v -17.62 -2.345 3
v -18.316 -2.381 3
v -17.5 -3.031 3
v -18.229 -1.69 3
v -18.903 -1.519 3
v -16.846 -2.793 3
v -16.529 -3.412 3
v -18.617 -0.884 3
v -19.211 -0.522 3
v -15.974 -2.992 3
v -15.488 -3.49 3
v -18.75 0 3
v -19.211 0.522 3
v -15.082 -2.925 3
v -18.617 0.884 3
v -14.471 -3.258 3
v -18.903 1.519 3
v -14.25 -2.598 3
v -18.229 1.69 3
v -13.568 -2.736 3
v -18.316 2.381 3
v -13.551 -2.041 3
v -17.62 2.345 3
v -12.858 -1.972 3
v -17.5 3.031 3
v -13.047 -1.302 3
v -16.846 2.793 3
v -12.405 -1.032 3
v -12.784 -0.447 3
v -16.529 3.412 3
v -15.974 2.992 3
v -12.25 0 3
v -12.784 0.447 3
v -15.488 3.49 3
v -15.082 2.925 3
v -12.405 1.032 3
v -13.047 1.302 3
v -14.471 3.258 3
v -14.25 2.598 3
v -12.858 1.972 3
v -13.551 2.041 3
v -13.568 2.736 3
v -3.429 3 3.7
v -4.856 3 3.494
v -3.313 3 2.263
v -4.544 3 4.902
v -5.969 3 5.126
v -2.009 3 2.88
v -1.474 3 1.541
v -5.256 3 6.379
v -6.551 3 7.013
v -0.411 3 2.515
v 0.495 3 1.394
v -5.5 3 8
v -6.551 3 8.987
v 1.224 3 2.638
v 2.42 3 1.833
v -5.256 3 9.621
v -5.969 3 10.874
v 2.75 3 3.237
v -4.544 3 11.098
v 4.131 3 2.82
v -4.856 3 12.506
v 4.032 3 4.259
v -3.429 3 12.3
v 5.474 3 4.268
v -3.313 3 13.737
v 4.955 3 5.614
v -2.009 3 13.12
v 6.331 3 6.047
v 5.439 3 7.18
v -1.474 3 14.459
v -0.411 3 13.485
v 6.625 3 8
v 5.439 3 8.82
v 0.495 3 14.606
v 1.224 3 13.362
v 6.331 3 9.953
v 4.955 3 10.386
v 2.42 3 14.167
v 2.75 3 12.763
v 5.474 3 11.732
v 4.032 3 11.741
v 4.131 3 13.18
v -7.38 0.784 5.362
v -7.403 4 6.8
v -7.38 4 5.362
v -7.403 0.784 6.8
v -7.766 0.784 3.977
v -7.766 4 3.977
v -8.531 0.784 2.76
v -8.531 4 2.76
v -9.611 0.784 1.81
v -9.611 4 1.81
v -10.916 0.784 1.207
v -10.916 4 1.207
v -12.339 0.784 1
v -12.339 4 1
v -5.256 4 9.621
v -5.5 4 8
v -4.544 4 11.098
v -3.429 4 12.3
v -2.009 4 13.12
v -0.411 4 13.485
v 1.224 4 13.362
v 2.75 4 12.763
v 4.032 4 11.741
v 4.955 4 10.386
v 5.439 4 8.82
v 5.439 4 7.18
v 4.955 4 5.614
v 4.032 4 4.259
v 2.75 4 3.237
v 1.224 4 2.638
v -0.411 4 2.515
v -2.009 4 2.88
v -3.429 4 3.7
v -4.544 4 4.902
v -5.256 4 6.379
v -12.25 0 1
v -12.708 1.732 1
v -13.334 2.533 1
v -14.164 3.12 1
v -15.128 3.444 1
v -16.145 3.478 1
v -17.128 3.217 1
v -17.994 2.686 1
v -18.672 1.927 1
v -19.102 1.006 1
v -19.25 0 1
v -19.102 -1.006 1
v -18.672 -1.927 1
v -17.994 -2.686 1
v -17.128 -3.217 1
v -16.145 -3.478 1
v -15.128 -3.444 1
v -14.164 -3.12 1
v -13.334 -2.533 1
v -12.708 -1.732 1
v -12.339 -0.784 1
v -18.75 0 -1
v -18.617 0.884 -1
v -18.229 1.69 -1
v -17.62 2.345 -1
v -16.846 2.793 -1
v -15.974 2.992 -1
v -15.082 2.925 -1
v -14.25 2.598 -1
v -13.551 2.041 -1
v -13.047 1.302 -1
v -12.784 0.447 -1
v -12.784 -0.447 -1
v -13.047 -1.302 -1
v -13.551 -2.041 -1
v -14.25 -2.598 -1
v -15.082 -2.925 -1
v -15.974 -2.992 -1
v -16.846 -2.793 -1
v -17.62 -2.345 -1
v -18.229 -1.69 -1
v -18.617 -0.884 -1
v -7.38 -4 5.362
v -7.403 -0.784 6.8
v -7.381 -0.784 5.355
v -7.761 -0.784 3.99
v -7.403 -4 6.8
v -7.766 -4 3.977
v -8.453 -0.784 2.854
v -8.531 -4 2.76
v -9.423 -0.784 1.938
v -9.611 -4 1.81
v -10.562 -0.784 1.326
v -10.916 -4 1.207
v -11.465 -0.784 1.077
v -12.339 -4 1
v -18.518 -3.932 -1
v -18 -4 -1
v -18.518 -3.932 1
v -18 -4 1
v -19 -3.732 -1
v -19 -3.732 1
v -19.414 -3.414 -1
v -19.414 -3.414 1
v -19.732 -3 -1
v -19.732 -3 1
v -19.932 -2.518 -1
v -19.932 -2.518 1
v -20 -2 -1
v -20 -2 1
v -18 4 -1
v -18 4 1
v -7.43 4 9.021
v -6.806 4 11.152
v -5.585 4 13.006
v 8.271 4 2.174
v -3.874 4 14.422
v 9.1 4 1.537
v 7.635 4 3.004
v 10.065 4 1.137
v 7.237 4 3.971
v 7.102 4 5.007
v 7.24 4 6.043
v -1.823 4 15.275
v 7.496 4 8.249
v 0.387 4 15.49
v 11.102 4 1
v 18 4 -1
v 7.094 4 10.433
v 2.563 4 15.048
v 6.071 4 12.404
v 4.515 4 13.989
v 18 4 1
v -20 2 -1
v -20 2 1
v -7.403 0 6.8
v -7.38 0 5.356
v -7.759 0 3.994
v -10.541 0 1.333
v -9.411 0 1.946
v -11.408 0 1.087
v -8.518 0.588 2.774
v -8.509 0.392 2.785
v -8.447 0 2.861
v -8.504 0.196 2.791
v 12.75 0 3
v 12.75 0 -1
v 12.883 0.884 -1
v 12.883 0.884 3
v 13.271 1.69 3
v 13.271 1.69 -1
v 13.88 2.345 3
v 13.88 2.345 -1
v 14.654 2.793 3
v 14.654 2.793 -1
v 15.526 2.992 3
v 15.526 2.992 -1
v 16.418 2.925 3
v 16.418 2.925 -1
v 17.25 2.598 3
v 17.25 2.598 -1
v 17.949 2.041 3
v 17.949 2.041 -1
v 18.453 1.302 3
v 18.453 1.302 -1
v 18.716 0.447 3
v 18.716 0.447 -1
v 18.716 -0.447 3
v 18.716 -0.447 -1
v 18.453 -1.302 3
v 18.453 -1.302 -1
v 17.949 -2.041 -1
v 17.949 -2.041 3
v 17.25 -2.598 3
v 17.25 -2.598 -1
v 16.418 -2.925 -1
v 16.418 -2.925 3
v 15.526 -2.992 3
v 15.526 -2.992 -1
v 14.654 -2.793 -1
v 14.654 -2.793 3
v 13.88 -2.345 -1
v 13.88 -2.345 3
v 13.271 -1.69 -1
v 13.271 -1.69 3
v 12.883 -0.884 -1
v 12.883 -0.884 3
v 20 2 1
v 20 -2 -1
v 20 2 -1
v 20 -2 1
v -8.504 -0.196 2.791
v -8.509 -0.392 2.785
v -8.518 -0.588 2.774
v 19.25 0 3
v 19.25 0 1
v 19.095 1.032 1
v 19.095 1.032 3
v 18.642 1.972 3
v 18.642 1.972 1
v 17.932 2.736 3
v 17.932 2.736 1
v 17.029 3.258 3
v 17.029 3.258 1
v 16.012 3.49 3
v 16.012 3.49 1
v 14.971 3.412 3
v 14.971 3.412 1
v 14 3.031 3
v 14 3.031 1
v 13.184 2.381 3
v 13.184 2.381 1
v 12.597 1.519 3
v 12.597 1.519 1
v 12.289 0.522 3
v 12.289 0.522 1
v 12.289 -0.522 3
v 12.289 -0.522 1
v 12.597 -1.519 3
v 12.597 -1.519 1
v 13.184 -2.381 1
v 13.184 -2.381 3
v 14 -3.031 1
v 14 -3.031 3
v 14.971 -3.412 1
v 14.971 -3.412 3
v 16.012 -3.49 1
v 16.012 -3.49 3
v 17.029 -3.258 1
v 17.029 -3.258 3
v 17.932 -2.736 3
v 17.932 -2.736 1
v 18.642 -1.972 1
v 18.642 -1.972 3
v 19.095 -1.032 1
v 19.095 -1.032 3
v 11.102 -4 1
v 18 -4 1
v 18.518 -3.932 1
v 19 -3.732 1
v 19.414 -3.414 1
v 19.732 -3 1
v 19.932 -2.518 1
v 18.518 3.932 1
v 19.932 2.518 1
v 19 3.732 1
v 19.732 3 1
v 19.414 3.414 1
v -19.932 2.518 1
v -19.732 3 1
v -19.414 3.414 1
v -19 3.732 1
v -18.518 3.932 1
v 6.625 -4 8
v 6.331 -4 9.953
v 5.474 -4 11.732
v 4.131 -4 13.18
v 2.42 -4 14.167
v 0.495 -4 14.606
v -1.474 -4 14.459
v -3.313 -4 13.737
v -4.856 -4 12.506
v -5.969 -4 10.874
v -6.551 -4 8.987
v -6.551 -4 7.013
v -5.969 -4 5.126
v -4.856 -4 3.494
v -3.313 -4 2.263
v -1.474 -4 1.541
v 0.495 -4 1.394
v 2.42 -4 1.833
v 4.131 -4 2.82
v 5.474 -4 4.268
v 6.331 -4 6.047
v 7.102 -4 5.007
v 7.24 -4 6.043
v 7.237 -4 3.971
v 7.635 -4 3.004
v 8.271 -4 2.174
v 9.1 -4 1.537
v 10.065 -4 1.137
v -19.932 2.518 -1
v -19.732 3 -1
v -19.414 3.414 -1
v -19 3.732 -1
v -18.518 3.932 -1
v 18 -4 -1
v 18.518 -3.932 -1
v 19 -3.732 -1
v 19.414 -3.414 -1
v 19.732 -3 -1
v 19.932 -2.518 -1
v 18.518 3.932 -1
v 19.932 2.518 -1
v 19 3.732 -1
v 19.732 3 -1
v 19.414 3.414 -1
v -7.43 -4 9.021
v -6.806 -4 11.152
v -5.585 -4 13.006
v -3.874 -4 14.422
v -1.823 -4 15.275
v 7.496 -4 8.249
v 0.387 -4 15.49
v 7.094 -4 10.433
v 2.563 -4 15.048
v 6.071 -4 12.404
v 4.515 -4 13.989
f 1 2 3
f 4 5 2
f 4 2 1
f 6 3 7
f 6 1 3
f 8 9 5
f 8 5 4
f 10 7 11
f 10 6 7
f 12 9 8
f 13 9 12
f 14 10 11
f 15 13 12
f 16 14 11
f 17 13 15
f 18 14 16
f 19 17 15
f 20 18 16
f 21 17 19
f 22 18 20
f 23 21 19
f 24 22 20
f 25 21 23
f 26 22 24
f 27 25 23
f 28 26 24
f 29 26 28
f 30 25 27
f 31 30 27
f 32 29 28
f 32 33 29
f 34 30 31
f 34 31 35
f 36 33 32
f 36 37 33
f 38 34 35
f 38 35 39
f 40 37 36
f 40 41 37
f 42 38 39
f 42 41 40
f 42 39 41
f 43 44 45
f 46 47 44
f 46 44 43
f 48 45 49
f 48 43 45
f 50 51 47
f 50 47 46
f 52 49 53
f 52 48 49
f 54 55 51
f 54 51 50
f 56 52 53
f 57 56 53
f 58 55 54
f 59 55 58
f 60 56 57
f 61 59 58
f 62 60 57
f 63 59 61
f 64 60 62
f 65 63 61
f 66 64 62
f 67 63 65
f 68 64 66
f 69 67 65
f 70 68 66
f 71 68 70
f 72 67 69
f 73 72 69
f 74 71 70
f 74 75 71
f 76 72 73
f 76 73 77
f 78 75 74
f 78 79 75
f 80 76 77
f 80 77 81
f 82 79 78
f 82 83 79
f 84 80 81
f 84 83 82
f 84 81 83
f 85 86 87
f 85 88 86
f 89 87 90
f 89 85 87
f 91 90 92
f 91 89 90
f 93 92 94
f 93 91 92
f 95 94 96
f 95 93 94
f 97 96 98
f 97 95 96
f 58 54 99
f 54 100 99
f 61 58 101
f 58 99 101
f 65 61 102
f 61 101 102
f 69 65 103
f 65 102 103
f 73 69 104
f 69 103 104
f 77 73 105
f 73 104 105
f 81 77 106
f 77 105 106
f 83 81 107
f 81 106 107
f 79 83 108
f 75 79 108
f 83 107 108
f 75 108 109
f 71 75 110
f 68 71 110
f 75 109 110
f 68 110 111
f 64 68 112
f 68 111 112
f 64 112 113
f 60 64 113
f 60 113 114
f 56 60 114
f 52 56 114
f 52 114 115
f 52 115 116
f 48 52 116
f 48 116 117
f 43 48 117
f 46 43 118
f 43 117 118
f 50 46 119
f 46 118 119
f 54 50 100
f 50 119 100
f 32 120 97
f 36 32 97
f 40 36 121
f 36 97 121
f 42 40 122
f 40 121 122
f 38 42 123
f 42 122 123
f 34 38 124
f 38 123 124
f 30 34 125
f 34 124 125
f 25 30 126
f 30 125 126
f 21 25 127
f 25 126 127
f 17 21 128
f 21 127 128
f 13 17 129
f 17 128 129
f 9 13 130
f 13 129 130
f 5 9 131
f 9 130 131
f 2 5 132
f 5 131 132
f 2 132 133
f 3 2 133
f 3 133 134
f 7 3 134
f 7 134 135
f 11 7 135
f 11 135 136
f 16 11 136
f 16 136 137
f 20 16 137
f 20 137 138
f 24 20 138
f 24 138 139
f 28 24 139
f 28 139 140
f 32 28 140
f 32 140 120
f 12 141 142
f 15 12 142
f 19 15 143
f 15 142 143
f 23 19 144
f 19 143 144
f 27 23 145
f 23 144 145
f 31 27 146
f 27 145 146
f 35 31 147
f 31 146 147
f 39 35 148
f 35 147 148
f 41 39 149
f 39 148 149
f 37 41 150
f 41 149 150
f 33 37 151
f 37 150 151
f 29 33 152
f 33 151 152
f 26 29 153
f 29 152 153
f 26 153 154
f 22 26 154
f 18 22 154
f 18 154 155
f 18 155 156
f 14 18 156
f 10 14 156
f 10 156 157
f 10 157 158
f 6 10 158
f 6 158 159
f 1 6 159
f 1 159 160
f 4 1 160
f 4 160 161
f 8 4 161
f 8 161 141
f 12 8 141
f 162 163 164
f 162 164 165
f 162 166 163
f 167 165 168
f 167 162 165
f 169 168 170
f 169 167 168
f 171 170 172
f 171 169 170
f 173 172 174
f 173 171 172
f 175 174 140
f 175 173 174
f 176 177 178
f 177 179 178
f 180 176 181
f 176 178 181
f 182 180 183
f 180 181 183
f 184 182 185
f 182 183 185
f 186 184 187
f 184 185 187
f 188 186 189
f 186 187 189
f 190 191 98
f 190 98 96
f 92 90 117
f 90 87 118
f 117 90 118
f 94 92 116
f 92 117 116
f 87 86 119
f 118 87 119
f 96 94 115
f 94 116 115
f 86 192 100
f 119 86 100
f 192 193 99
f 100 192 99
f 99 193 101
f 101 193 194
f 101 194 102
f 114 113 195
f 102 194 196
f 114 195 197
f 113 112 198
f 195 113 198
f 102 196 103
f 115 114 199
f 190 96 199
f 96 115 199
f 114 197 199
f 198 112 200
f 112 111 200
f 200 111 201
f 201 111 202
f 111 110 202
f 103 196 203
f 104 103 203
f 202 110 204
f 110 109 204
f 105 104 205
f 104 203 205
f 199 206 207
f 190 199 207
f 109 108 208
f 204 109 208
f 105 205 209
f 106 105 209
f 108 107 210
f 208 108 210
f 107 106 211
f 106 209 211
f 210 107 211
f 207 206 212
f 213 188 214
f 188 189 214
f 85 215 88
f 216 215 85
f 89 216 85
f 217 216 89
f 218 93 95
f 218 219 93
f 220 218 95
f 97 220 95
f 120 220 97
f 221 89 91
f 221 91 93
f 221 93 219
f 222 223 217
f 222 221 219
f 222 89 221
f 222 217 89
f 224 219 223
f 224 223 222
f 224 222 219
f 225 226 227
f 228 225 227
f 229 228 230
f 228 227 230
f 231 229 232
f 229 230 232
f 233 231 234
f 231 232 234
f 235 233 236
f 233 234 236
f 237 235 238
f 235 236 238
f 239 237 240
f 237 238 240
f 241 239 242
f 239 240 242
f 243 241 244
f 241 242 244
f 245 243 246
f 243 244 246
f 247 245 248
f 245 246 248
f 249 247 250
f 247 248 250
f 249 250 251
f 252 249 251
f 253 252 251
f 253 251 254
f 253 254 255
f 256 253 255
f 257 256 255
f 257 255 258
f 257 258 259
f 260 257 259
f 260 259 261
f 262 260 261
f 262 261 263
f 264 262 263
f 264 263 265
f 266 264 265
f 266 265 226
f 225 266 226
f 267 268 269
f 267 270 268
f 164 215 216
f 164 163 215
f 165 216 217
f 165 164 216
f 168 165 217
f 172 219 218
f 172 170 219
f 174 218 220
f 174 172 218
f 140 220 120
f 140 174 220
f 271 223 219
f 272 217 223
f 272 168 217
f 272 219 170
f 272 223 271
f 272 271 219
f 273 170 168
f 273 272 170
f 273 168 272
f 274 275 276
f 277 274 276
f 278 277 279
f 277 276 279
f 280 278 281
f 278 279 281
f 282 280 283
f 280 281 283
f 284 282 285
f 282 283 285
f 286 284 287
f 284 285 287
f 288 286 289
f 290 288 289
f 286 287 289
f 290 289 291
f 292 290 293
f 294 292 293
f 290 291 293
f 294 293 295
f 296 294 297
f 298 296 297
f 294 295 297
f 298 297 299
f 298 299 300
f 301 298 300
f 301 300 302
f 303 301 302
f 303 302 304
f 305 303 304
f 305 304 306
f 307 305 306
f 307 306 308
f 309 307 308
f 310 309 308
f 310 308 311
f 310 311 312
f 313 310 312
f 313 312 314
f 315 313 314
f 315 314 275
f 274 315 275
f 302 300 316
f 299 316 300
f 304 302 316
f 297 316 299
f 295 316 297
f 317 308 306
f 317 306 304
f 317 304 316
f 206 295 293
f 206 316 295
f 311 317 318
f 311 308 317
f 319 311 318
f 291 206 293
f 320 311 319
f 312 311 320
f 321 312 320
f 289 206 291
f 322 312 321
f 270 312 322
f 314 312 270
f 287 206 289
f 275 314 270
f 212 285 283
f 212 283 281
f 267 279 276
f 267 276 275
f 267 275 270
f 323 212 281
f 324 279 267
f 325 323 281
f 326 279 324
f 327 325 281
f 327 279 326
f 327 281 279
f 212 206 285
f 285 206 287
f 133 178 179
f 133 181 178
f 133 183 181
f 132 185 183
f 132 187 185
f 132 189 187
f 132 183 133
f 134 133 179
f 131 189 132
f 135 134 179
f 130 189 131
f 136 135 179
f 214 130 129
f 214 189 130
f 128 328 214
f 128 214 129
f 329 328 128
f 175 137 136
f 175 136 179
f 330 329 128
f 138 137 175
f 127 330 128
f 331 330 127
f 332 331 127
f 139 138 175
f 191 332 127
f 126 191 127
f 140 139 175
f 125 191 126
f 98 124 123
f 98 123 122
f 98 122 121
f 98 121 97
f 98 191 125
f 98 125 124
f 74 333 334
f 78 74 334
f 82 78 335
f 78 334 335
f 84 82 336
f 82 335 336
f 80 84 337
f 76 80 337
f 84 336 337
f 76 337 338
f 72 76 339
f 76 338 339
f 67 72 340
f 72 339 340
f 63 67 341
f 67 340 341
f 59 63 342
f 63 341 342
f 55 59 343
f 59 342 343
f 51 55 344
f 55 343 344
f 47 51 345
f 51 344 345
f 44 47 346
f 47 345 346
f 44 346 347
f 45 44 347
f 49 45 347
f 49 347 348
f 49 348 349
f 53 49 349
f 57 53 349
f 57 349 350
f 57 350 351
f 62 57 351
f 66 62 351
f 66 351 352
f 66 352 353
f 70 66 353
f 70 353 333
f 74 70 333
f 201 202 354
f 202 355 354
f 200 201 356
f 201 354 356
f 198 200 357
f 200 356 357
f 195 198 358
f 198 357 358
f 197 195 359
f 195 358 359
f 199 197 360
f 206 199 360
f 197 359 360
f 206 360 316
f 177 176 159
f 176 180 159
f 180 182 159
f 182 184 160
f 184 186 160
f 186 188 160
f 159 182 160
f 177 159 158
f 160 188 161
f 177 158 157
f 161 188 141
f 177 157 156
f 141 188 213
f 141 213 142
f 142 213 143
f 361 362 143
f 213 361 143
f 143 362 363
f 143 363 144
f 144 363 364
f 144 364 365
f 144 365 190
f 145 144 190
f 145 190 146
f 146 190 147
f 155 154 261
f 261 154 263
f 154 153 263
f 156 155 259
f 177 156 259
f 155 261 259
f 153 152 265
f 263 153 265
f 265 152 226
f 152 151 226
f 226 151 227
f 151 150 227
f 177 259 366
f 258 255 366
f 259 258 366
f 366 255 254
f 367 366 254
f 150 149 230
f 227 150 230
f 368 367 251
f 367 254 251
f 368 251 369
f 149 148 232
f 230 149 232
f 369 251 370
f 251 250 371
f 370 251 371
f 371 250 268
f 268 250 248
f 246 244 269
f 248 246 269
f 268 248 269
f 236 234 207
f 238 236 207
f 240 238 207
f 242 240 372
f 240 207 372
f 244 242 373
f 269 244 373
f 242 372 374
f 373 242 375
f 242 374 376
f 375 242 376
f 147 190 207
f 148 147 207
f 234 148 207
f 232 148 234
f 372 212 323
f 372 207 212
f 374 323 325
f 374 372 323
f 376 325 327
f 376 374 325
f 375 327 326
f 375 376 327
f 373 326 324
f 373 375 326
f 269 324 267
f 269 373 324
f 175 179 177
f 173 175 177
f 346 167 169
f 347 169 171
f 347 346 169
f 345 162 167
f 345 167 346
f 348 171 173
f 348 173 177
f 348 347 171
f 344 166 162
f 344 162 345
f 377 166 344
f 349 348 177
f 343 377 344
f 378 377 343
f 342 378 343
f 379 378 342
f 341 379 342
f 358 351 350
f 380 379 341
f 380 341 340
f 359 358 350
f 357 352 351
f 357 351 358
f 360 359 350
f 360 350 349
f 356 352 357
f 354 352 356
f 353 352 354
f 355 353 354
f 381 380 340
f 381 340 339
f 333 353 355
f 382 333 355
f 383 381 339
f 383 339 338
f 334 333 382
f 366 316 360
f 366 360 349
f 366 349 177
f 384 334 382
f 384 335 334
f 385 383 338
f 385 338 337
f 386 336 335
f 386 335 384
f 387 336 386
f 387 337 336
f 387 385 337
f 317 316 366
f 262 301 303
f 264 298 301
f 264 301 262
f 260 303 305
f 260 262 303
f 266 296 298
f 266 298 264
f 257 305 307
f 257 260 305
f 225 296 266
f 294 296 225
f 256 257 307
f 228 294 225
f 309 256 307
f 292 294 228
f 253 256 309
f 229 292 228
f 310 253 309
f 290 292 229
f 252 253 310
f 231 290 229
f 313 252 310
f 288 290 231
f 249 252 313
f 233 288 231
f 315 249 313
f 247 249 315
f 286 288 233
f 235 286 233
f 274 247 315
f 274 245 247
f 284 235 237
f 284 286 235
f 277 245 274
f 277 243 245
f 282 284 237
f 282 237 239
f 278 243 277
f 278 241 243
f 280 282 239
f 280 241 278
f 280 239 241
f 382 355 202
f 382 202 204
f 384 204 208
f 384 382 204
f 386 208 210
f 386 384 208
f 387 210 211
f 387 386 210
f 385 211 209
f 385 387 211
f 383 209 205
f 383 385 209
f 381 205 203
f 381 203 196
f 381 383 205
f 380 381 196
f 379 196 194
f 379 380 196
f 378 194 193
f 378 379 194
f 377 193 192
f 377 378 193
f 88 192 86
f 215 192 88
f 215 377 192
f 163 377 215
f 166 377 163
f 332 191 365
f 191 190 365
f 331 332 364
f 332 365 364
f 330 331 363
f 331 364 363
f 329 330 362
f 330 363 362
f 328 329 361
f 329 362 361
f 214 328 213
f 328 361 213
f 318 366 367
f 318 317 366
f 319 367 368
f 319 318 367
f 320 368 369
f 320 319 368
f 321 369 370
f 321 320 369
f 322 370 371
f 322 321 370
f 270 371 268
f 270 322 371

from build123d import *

# Parameters (mm, degrees)
F0_W           = 40
F0_H           = 8
F2_DEPTH       = 1
F1_R           = 3.5
F3_DEPTH       = 3
F4_R           = 7.5
F5_DEPTH       = 4
F6_R           = 4
F7_R           = 5
F9_D           = 11
F9_CBORE_D     = 13.25
F9_CBORE_DEPTH = 7
F12_D          = 6
F13_R          = 2


with BuildPart() as f2:
    # F0 (on Top) → F2 (new body, symmetric)
    with BuildSketch(Plane.XY):
        Rectangle(F0_W, F0_H)
    extrude(amount=F2_DEPTH, both=True)

    # F1 (on face) → F3 (join)
    with BuildSketch(Plane.XY):
        with Locations((-15.75, 0)):
            Circle(F1_R)
        with Locations((15.75, 0)):
            Circle(F1_R)
    extrude(amount=F3_DEPTH)

    # F4 (on Front) → F5 (join, symmetric)
    with BuildSketch(Plane.XZ):
        with Locations((0, 8)):
            Circle(F4_R)
    extrude(amount=F5_DEPTH, both=True)

    # F6
    f6_edges = [f2.edges().sort_by_distance(p)[0] for p in [
        (2.692582, 0, 1),
    ]]
    fillet(f6_edges, radius=F6_R)

    # F7
    f7_edges = [f2.edges().sort_by_distance(p)[0] for p in [
        (-2.692582, 0, 1),
    ]]
    fillet(f7_edges, radius=F7_R)

    # F9 (through all)
    with Locations(Plane.XZ.offset(4)):
        with Locations((0, 8)):
            CounterBoreHole(F9_D / 2, F9_CBORE_D / 2, F9_CBORE_DEPTH)

    # F12 (through all)
    with Locations(Plane.XY.offset(3)):
        with Locations((15.75, 0), (-15.75, 0)):
            Hole(F12_D / 2)

    # F13
    f13_edges = [f2.edges().sort_by_distance(p)[0] for p in [
        (-20, -4, 0),
        (-20, 4, 0),
        (20, 4, 0),
        (20, -4, 0),
    ]]
    fillet(f13_edges, radius=F13_R)


solid = f2.part
